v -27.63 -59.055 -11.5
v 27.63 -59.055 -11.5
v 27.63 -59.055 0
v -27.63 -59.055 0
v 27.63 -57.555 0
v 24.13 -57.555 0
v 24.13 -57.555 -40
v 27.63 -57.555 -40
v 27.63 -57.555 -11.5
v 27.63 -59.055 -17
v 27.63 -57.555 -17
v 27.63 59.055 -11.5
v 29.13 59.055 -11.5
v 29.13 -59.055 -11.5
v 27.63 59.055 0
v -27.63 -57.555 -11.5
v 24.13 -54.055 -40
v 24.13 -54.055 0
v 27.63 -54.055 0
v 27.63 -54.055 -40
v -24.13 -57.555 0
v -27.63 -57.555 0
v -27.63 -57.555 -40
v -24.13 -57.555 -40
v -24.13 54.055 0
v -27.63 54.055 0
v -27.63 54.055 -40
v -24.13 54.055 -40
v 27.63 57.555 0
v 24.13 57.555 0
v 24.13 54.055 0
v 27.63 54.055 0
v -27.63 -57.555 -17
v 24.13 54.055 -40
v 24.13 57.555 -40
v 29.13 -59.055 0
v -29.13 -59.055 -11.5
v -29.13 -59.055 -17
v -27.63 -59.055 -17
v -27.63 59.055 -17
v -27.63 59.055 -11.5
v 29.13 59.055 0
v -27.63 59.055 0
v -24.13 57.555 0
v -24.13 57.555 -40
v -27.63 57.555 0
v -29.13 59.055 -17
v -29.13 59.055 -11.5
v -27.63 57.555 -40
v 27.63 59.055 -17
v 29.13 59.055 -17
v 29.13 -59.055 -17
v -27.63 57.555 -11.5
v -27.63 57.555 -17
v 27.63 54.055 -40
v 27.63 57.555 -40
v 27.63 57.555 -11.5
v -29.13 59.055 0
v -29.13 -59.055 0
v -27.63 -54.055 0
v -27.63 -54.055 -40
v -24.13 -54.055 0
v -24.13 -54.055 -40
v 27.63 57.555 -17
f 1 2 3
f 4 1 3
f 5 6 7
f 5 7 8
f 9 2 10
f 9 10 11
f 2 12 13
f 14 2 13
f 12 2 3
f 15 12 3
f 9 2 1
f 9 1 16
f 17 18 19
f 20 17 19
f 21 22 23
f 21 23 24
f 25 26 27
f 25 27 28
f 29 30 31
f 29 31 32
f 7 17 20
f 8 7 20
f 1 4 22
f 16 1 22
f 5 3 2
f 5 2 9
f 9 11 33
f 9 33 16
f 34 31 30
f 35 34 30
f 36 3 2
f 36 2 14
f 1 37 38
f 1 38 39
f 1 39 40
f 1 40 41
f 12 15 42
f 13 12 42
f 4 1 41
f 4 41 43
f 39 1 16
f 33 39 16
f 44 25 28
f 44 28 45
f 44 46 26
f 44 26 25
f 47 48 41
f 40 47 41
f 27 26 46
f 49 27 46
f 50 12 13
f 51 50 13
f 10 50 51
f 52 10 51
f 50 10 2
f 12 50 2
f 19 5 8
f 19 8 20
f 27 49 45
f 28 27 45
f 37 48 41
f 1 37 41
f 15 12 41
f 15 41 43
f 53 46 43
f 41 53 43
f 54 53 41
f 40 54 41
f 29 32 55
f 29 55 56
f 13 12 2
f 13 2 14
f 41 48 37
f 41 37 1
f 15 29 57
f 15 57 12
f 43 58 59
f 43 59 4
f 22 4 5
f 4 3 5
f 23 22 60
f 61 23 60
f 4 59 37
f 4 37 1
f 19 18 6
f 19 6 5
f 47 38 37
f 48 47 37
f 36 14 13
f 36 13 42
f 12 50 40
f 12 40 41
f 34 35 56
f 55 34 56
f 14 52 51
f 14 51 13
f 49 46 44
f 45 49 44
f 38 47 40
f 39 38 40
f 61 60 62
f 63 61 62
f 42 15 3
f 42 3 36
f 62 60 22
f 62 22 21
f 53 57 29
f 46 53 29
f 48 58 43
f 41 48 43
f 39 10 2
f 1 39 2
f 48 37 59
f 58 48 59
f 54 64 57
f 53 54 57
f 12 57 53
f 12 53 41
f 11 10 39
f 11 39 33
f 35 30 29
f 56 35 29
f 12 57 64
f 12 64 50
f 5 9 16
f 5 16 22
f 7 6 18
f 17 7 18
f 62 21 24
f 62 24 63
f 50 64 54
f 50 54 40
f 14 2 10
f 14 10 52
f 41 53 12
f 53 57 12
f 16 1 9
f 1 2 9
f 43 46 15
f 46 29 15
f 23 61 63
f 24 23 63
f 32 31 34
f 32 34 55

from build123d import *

# Parameters (mm, degrees)
F1_W          = 1.5
F1_H          = 11.5
F2_DEPTH      = 59.055
F2_DEPTH_BACK = 59.055
F1_H_2        = 5.5
F3_DEPTH      = 59.055
F3_DEPTH_BACK = 59.055
F4_W          = 1.5
F4_H          = 11.5
F5_DEPTH      = 27.63
F5_DEPTH_BACK = 27.63
F4_H_2        = 5.5
F6_DEPTH      = 27.63
F6_DEPTH_BACK = 27.63
F7_W          = 3.5
F7_H          = 3.5
F9_DEPTH      = 40


with BuildPart() as f2:
    # F1 (on Front) → F2 (new body, two sides)
    with BuildSketch(Plane.XZ) as f2_sk:
        with Locations((-28.38, -5.75)):
            Rectangle(F1_W, F1_H)
    extrude(amount=F2_DEPTH)
    extrude(f2_sk.sketch, amount=-F2_DEPTH_BACK)


with BuildPart() as f2b:
    # F1 (on Front) → F2, piece 2 (new body, two sides)
    with BuildSketch(Plane.XZ) as f2_2_sk:
        with Locations((28.38, -5.75)):
            Rectangle(F1_W, F1_H)
    extrude(amount=F2_DEPTH)
    extrude(f2_2_sk.sketch, amount=-F2_DEPTH_BACK)


with BuildPart() as f3:
    # F1 (on Front) → F3 (new body, two sides)
    with BuildSketch(Plane.XZ) as f3_sk:
        with Locations((-28.38, -14.25)):
            Rectangle(F1_W, F1_H_2)
    extrude(amount=F3_DEPTH)
    extrude(f3_sk.sketch, amount=-F3_DEPTH_BACK)


with BuildPart() as f3b:
    # F1 (on Front) → F3, piece 2 (new body, two sides)
    with BuildSketch(Plane.XZ) as f3_2_sk:
        with Locations((28.38, -14.25)):
            Rectangle(F1_W, F1_H_2)
    extrude(amount=F3_DEPTH)
    extrude(f3_2_sk.sketch, amount=-F3_DEPTH_BACK)


with BuildPart() as f5:
    # F4 (on Right) → F5 (new body, two sides)
    with BuildSketch(Plane.YZ) as f5_sk:
        with Locations((58.305, -5.75)):
            Rectangle(F4_W, F4_H)
    extrude(amount=F5_DEPTH)
    extrude(f5_sk.sketch, amount=-F5_DEPTH_BACK)


with BuildPart() as f5b:
    # F4 (on Right) → F5, piece 2 (new body, two sides)
    with BuildSketch(Plane.YZ) as f5_2_sk:
        with Locations((-58.305, -5.75)):
            Rectangle(F4_W, F4_H)
    extrude(amount=F5_DEPTH)
    extrude(f5_2_sk.sketch, amount=-F5_DEPTH_BACK)


with BuildPart() as f6:
    # F4 (on Right) → F6 (new body, two sides)
    with BuildSketch(Plane.YZ) as f6_sk:
        with Locations((-58.305, -14.25)):
            Rectangle(F4_W, F4_H_2)
    extrude(amount=F6_DEPTH)
    extrude(f6_sk.sketch, amount=-F6_DEPTH_BACK)


with BuildPart() as f6b:
    # F4 (on Right) → F6, piece 2 (new body, two sides)
    with BuildSketch(Plane.YZ) as f6_2_sk:
        with Locations((58.305, -14.25)):
            Rectangle(F4_W, F4_H_2)
    extrude(amount=F6_DEPTH)
    extrude(f6_2_sk.sketch, amount=-F6_DEPTH_BACK)


with BuildPart() as f9:
    # F7 (on Top) → F9 (new body, through all)
    with BuildSketch(Plane.XY):
        with Locations((-25.88, 55.805)):
            Rectangle(F7_W, F7_H)
    extrude(amount=-F9_DEPTH)


with BuildPart() as f9b:
    # F7 (on Top) → F9, piece 2 (new body, through all)
    with BuildSketch(Plane.XY):
        with Locations((25.88, 55.805)):
            Rectangle(F7_W, F7_H)
    extrude(amount=-F9_DEPTH)


with BuildPart() as f9c:
    # F7 (on Top) → F9, piece 3 (new body, through all)
    with BuildSketch(Plane.XY):
        with Locations((-25.88, -55.805)):
            Rectangle(F7_W, F7_H)
    extrude(amount=-F9_DEPTH)


with BuildPart() as f9d:
    # F7 (on Top) → F9, piece 4 (new body, through all)
    with BuildSketch(Plane.XY):
        with Locations((25.88, -55.805)):
            Rectangle(F7_W, F7_H)
    extrude(amount=-F9_DEPTH)


solid = Compound([f2.part, f2b.part, f3.part, f3b.part, f5.part, f5b.part, f6.part, f6b.part, f9.part, f9b.part, f9c.part, f9d.part])
